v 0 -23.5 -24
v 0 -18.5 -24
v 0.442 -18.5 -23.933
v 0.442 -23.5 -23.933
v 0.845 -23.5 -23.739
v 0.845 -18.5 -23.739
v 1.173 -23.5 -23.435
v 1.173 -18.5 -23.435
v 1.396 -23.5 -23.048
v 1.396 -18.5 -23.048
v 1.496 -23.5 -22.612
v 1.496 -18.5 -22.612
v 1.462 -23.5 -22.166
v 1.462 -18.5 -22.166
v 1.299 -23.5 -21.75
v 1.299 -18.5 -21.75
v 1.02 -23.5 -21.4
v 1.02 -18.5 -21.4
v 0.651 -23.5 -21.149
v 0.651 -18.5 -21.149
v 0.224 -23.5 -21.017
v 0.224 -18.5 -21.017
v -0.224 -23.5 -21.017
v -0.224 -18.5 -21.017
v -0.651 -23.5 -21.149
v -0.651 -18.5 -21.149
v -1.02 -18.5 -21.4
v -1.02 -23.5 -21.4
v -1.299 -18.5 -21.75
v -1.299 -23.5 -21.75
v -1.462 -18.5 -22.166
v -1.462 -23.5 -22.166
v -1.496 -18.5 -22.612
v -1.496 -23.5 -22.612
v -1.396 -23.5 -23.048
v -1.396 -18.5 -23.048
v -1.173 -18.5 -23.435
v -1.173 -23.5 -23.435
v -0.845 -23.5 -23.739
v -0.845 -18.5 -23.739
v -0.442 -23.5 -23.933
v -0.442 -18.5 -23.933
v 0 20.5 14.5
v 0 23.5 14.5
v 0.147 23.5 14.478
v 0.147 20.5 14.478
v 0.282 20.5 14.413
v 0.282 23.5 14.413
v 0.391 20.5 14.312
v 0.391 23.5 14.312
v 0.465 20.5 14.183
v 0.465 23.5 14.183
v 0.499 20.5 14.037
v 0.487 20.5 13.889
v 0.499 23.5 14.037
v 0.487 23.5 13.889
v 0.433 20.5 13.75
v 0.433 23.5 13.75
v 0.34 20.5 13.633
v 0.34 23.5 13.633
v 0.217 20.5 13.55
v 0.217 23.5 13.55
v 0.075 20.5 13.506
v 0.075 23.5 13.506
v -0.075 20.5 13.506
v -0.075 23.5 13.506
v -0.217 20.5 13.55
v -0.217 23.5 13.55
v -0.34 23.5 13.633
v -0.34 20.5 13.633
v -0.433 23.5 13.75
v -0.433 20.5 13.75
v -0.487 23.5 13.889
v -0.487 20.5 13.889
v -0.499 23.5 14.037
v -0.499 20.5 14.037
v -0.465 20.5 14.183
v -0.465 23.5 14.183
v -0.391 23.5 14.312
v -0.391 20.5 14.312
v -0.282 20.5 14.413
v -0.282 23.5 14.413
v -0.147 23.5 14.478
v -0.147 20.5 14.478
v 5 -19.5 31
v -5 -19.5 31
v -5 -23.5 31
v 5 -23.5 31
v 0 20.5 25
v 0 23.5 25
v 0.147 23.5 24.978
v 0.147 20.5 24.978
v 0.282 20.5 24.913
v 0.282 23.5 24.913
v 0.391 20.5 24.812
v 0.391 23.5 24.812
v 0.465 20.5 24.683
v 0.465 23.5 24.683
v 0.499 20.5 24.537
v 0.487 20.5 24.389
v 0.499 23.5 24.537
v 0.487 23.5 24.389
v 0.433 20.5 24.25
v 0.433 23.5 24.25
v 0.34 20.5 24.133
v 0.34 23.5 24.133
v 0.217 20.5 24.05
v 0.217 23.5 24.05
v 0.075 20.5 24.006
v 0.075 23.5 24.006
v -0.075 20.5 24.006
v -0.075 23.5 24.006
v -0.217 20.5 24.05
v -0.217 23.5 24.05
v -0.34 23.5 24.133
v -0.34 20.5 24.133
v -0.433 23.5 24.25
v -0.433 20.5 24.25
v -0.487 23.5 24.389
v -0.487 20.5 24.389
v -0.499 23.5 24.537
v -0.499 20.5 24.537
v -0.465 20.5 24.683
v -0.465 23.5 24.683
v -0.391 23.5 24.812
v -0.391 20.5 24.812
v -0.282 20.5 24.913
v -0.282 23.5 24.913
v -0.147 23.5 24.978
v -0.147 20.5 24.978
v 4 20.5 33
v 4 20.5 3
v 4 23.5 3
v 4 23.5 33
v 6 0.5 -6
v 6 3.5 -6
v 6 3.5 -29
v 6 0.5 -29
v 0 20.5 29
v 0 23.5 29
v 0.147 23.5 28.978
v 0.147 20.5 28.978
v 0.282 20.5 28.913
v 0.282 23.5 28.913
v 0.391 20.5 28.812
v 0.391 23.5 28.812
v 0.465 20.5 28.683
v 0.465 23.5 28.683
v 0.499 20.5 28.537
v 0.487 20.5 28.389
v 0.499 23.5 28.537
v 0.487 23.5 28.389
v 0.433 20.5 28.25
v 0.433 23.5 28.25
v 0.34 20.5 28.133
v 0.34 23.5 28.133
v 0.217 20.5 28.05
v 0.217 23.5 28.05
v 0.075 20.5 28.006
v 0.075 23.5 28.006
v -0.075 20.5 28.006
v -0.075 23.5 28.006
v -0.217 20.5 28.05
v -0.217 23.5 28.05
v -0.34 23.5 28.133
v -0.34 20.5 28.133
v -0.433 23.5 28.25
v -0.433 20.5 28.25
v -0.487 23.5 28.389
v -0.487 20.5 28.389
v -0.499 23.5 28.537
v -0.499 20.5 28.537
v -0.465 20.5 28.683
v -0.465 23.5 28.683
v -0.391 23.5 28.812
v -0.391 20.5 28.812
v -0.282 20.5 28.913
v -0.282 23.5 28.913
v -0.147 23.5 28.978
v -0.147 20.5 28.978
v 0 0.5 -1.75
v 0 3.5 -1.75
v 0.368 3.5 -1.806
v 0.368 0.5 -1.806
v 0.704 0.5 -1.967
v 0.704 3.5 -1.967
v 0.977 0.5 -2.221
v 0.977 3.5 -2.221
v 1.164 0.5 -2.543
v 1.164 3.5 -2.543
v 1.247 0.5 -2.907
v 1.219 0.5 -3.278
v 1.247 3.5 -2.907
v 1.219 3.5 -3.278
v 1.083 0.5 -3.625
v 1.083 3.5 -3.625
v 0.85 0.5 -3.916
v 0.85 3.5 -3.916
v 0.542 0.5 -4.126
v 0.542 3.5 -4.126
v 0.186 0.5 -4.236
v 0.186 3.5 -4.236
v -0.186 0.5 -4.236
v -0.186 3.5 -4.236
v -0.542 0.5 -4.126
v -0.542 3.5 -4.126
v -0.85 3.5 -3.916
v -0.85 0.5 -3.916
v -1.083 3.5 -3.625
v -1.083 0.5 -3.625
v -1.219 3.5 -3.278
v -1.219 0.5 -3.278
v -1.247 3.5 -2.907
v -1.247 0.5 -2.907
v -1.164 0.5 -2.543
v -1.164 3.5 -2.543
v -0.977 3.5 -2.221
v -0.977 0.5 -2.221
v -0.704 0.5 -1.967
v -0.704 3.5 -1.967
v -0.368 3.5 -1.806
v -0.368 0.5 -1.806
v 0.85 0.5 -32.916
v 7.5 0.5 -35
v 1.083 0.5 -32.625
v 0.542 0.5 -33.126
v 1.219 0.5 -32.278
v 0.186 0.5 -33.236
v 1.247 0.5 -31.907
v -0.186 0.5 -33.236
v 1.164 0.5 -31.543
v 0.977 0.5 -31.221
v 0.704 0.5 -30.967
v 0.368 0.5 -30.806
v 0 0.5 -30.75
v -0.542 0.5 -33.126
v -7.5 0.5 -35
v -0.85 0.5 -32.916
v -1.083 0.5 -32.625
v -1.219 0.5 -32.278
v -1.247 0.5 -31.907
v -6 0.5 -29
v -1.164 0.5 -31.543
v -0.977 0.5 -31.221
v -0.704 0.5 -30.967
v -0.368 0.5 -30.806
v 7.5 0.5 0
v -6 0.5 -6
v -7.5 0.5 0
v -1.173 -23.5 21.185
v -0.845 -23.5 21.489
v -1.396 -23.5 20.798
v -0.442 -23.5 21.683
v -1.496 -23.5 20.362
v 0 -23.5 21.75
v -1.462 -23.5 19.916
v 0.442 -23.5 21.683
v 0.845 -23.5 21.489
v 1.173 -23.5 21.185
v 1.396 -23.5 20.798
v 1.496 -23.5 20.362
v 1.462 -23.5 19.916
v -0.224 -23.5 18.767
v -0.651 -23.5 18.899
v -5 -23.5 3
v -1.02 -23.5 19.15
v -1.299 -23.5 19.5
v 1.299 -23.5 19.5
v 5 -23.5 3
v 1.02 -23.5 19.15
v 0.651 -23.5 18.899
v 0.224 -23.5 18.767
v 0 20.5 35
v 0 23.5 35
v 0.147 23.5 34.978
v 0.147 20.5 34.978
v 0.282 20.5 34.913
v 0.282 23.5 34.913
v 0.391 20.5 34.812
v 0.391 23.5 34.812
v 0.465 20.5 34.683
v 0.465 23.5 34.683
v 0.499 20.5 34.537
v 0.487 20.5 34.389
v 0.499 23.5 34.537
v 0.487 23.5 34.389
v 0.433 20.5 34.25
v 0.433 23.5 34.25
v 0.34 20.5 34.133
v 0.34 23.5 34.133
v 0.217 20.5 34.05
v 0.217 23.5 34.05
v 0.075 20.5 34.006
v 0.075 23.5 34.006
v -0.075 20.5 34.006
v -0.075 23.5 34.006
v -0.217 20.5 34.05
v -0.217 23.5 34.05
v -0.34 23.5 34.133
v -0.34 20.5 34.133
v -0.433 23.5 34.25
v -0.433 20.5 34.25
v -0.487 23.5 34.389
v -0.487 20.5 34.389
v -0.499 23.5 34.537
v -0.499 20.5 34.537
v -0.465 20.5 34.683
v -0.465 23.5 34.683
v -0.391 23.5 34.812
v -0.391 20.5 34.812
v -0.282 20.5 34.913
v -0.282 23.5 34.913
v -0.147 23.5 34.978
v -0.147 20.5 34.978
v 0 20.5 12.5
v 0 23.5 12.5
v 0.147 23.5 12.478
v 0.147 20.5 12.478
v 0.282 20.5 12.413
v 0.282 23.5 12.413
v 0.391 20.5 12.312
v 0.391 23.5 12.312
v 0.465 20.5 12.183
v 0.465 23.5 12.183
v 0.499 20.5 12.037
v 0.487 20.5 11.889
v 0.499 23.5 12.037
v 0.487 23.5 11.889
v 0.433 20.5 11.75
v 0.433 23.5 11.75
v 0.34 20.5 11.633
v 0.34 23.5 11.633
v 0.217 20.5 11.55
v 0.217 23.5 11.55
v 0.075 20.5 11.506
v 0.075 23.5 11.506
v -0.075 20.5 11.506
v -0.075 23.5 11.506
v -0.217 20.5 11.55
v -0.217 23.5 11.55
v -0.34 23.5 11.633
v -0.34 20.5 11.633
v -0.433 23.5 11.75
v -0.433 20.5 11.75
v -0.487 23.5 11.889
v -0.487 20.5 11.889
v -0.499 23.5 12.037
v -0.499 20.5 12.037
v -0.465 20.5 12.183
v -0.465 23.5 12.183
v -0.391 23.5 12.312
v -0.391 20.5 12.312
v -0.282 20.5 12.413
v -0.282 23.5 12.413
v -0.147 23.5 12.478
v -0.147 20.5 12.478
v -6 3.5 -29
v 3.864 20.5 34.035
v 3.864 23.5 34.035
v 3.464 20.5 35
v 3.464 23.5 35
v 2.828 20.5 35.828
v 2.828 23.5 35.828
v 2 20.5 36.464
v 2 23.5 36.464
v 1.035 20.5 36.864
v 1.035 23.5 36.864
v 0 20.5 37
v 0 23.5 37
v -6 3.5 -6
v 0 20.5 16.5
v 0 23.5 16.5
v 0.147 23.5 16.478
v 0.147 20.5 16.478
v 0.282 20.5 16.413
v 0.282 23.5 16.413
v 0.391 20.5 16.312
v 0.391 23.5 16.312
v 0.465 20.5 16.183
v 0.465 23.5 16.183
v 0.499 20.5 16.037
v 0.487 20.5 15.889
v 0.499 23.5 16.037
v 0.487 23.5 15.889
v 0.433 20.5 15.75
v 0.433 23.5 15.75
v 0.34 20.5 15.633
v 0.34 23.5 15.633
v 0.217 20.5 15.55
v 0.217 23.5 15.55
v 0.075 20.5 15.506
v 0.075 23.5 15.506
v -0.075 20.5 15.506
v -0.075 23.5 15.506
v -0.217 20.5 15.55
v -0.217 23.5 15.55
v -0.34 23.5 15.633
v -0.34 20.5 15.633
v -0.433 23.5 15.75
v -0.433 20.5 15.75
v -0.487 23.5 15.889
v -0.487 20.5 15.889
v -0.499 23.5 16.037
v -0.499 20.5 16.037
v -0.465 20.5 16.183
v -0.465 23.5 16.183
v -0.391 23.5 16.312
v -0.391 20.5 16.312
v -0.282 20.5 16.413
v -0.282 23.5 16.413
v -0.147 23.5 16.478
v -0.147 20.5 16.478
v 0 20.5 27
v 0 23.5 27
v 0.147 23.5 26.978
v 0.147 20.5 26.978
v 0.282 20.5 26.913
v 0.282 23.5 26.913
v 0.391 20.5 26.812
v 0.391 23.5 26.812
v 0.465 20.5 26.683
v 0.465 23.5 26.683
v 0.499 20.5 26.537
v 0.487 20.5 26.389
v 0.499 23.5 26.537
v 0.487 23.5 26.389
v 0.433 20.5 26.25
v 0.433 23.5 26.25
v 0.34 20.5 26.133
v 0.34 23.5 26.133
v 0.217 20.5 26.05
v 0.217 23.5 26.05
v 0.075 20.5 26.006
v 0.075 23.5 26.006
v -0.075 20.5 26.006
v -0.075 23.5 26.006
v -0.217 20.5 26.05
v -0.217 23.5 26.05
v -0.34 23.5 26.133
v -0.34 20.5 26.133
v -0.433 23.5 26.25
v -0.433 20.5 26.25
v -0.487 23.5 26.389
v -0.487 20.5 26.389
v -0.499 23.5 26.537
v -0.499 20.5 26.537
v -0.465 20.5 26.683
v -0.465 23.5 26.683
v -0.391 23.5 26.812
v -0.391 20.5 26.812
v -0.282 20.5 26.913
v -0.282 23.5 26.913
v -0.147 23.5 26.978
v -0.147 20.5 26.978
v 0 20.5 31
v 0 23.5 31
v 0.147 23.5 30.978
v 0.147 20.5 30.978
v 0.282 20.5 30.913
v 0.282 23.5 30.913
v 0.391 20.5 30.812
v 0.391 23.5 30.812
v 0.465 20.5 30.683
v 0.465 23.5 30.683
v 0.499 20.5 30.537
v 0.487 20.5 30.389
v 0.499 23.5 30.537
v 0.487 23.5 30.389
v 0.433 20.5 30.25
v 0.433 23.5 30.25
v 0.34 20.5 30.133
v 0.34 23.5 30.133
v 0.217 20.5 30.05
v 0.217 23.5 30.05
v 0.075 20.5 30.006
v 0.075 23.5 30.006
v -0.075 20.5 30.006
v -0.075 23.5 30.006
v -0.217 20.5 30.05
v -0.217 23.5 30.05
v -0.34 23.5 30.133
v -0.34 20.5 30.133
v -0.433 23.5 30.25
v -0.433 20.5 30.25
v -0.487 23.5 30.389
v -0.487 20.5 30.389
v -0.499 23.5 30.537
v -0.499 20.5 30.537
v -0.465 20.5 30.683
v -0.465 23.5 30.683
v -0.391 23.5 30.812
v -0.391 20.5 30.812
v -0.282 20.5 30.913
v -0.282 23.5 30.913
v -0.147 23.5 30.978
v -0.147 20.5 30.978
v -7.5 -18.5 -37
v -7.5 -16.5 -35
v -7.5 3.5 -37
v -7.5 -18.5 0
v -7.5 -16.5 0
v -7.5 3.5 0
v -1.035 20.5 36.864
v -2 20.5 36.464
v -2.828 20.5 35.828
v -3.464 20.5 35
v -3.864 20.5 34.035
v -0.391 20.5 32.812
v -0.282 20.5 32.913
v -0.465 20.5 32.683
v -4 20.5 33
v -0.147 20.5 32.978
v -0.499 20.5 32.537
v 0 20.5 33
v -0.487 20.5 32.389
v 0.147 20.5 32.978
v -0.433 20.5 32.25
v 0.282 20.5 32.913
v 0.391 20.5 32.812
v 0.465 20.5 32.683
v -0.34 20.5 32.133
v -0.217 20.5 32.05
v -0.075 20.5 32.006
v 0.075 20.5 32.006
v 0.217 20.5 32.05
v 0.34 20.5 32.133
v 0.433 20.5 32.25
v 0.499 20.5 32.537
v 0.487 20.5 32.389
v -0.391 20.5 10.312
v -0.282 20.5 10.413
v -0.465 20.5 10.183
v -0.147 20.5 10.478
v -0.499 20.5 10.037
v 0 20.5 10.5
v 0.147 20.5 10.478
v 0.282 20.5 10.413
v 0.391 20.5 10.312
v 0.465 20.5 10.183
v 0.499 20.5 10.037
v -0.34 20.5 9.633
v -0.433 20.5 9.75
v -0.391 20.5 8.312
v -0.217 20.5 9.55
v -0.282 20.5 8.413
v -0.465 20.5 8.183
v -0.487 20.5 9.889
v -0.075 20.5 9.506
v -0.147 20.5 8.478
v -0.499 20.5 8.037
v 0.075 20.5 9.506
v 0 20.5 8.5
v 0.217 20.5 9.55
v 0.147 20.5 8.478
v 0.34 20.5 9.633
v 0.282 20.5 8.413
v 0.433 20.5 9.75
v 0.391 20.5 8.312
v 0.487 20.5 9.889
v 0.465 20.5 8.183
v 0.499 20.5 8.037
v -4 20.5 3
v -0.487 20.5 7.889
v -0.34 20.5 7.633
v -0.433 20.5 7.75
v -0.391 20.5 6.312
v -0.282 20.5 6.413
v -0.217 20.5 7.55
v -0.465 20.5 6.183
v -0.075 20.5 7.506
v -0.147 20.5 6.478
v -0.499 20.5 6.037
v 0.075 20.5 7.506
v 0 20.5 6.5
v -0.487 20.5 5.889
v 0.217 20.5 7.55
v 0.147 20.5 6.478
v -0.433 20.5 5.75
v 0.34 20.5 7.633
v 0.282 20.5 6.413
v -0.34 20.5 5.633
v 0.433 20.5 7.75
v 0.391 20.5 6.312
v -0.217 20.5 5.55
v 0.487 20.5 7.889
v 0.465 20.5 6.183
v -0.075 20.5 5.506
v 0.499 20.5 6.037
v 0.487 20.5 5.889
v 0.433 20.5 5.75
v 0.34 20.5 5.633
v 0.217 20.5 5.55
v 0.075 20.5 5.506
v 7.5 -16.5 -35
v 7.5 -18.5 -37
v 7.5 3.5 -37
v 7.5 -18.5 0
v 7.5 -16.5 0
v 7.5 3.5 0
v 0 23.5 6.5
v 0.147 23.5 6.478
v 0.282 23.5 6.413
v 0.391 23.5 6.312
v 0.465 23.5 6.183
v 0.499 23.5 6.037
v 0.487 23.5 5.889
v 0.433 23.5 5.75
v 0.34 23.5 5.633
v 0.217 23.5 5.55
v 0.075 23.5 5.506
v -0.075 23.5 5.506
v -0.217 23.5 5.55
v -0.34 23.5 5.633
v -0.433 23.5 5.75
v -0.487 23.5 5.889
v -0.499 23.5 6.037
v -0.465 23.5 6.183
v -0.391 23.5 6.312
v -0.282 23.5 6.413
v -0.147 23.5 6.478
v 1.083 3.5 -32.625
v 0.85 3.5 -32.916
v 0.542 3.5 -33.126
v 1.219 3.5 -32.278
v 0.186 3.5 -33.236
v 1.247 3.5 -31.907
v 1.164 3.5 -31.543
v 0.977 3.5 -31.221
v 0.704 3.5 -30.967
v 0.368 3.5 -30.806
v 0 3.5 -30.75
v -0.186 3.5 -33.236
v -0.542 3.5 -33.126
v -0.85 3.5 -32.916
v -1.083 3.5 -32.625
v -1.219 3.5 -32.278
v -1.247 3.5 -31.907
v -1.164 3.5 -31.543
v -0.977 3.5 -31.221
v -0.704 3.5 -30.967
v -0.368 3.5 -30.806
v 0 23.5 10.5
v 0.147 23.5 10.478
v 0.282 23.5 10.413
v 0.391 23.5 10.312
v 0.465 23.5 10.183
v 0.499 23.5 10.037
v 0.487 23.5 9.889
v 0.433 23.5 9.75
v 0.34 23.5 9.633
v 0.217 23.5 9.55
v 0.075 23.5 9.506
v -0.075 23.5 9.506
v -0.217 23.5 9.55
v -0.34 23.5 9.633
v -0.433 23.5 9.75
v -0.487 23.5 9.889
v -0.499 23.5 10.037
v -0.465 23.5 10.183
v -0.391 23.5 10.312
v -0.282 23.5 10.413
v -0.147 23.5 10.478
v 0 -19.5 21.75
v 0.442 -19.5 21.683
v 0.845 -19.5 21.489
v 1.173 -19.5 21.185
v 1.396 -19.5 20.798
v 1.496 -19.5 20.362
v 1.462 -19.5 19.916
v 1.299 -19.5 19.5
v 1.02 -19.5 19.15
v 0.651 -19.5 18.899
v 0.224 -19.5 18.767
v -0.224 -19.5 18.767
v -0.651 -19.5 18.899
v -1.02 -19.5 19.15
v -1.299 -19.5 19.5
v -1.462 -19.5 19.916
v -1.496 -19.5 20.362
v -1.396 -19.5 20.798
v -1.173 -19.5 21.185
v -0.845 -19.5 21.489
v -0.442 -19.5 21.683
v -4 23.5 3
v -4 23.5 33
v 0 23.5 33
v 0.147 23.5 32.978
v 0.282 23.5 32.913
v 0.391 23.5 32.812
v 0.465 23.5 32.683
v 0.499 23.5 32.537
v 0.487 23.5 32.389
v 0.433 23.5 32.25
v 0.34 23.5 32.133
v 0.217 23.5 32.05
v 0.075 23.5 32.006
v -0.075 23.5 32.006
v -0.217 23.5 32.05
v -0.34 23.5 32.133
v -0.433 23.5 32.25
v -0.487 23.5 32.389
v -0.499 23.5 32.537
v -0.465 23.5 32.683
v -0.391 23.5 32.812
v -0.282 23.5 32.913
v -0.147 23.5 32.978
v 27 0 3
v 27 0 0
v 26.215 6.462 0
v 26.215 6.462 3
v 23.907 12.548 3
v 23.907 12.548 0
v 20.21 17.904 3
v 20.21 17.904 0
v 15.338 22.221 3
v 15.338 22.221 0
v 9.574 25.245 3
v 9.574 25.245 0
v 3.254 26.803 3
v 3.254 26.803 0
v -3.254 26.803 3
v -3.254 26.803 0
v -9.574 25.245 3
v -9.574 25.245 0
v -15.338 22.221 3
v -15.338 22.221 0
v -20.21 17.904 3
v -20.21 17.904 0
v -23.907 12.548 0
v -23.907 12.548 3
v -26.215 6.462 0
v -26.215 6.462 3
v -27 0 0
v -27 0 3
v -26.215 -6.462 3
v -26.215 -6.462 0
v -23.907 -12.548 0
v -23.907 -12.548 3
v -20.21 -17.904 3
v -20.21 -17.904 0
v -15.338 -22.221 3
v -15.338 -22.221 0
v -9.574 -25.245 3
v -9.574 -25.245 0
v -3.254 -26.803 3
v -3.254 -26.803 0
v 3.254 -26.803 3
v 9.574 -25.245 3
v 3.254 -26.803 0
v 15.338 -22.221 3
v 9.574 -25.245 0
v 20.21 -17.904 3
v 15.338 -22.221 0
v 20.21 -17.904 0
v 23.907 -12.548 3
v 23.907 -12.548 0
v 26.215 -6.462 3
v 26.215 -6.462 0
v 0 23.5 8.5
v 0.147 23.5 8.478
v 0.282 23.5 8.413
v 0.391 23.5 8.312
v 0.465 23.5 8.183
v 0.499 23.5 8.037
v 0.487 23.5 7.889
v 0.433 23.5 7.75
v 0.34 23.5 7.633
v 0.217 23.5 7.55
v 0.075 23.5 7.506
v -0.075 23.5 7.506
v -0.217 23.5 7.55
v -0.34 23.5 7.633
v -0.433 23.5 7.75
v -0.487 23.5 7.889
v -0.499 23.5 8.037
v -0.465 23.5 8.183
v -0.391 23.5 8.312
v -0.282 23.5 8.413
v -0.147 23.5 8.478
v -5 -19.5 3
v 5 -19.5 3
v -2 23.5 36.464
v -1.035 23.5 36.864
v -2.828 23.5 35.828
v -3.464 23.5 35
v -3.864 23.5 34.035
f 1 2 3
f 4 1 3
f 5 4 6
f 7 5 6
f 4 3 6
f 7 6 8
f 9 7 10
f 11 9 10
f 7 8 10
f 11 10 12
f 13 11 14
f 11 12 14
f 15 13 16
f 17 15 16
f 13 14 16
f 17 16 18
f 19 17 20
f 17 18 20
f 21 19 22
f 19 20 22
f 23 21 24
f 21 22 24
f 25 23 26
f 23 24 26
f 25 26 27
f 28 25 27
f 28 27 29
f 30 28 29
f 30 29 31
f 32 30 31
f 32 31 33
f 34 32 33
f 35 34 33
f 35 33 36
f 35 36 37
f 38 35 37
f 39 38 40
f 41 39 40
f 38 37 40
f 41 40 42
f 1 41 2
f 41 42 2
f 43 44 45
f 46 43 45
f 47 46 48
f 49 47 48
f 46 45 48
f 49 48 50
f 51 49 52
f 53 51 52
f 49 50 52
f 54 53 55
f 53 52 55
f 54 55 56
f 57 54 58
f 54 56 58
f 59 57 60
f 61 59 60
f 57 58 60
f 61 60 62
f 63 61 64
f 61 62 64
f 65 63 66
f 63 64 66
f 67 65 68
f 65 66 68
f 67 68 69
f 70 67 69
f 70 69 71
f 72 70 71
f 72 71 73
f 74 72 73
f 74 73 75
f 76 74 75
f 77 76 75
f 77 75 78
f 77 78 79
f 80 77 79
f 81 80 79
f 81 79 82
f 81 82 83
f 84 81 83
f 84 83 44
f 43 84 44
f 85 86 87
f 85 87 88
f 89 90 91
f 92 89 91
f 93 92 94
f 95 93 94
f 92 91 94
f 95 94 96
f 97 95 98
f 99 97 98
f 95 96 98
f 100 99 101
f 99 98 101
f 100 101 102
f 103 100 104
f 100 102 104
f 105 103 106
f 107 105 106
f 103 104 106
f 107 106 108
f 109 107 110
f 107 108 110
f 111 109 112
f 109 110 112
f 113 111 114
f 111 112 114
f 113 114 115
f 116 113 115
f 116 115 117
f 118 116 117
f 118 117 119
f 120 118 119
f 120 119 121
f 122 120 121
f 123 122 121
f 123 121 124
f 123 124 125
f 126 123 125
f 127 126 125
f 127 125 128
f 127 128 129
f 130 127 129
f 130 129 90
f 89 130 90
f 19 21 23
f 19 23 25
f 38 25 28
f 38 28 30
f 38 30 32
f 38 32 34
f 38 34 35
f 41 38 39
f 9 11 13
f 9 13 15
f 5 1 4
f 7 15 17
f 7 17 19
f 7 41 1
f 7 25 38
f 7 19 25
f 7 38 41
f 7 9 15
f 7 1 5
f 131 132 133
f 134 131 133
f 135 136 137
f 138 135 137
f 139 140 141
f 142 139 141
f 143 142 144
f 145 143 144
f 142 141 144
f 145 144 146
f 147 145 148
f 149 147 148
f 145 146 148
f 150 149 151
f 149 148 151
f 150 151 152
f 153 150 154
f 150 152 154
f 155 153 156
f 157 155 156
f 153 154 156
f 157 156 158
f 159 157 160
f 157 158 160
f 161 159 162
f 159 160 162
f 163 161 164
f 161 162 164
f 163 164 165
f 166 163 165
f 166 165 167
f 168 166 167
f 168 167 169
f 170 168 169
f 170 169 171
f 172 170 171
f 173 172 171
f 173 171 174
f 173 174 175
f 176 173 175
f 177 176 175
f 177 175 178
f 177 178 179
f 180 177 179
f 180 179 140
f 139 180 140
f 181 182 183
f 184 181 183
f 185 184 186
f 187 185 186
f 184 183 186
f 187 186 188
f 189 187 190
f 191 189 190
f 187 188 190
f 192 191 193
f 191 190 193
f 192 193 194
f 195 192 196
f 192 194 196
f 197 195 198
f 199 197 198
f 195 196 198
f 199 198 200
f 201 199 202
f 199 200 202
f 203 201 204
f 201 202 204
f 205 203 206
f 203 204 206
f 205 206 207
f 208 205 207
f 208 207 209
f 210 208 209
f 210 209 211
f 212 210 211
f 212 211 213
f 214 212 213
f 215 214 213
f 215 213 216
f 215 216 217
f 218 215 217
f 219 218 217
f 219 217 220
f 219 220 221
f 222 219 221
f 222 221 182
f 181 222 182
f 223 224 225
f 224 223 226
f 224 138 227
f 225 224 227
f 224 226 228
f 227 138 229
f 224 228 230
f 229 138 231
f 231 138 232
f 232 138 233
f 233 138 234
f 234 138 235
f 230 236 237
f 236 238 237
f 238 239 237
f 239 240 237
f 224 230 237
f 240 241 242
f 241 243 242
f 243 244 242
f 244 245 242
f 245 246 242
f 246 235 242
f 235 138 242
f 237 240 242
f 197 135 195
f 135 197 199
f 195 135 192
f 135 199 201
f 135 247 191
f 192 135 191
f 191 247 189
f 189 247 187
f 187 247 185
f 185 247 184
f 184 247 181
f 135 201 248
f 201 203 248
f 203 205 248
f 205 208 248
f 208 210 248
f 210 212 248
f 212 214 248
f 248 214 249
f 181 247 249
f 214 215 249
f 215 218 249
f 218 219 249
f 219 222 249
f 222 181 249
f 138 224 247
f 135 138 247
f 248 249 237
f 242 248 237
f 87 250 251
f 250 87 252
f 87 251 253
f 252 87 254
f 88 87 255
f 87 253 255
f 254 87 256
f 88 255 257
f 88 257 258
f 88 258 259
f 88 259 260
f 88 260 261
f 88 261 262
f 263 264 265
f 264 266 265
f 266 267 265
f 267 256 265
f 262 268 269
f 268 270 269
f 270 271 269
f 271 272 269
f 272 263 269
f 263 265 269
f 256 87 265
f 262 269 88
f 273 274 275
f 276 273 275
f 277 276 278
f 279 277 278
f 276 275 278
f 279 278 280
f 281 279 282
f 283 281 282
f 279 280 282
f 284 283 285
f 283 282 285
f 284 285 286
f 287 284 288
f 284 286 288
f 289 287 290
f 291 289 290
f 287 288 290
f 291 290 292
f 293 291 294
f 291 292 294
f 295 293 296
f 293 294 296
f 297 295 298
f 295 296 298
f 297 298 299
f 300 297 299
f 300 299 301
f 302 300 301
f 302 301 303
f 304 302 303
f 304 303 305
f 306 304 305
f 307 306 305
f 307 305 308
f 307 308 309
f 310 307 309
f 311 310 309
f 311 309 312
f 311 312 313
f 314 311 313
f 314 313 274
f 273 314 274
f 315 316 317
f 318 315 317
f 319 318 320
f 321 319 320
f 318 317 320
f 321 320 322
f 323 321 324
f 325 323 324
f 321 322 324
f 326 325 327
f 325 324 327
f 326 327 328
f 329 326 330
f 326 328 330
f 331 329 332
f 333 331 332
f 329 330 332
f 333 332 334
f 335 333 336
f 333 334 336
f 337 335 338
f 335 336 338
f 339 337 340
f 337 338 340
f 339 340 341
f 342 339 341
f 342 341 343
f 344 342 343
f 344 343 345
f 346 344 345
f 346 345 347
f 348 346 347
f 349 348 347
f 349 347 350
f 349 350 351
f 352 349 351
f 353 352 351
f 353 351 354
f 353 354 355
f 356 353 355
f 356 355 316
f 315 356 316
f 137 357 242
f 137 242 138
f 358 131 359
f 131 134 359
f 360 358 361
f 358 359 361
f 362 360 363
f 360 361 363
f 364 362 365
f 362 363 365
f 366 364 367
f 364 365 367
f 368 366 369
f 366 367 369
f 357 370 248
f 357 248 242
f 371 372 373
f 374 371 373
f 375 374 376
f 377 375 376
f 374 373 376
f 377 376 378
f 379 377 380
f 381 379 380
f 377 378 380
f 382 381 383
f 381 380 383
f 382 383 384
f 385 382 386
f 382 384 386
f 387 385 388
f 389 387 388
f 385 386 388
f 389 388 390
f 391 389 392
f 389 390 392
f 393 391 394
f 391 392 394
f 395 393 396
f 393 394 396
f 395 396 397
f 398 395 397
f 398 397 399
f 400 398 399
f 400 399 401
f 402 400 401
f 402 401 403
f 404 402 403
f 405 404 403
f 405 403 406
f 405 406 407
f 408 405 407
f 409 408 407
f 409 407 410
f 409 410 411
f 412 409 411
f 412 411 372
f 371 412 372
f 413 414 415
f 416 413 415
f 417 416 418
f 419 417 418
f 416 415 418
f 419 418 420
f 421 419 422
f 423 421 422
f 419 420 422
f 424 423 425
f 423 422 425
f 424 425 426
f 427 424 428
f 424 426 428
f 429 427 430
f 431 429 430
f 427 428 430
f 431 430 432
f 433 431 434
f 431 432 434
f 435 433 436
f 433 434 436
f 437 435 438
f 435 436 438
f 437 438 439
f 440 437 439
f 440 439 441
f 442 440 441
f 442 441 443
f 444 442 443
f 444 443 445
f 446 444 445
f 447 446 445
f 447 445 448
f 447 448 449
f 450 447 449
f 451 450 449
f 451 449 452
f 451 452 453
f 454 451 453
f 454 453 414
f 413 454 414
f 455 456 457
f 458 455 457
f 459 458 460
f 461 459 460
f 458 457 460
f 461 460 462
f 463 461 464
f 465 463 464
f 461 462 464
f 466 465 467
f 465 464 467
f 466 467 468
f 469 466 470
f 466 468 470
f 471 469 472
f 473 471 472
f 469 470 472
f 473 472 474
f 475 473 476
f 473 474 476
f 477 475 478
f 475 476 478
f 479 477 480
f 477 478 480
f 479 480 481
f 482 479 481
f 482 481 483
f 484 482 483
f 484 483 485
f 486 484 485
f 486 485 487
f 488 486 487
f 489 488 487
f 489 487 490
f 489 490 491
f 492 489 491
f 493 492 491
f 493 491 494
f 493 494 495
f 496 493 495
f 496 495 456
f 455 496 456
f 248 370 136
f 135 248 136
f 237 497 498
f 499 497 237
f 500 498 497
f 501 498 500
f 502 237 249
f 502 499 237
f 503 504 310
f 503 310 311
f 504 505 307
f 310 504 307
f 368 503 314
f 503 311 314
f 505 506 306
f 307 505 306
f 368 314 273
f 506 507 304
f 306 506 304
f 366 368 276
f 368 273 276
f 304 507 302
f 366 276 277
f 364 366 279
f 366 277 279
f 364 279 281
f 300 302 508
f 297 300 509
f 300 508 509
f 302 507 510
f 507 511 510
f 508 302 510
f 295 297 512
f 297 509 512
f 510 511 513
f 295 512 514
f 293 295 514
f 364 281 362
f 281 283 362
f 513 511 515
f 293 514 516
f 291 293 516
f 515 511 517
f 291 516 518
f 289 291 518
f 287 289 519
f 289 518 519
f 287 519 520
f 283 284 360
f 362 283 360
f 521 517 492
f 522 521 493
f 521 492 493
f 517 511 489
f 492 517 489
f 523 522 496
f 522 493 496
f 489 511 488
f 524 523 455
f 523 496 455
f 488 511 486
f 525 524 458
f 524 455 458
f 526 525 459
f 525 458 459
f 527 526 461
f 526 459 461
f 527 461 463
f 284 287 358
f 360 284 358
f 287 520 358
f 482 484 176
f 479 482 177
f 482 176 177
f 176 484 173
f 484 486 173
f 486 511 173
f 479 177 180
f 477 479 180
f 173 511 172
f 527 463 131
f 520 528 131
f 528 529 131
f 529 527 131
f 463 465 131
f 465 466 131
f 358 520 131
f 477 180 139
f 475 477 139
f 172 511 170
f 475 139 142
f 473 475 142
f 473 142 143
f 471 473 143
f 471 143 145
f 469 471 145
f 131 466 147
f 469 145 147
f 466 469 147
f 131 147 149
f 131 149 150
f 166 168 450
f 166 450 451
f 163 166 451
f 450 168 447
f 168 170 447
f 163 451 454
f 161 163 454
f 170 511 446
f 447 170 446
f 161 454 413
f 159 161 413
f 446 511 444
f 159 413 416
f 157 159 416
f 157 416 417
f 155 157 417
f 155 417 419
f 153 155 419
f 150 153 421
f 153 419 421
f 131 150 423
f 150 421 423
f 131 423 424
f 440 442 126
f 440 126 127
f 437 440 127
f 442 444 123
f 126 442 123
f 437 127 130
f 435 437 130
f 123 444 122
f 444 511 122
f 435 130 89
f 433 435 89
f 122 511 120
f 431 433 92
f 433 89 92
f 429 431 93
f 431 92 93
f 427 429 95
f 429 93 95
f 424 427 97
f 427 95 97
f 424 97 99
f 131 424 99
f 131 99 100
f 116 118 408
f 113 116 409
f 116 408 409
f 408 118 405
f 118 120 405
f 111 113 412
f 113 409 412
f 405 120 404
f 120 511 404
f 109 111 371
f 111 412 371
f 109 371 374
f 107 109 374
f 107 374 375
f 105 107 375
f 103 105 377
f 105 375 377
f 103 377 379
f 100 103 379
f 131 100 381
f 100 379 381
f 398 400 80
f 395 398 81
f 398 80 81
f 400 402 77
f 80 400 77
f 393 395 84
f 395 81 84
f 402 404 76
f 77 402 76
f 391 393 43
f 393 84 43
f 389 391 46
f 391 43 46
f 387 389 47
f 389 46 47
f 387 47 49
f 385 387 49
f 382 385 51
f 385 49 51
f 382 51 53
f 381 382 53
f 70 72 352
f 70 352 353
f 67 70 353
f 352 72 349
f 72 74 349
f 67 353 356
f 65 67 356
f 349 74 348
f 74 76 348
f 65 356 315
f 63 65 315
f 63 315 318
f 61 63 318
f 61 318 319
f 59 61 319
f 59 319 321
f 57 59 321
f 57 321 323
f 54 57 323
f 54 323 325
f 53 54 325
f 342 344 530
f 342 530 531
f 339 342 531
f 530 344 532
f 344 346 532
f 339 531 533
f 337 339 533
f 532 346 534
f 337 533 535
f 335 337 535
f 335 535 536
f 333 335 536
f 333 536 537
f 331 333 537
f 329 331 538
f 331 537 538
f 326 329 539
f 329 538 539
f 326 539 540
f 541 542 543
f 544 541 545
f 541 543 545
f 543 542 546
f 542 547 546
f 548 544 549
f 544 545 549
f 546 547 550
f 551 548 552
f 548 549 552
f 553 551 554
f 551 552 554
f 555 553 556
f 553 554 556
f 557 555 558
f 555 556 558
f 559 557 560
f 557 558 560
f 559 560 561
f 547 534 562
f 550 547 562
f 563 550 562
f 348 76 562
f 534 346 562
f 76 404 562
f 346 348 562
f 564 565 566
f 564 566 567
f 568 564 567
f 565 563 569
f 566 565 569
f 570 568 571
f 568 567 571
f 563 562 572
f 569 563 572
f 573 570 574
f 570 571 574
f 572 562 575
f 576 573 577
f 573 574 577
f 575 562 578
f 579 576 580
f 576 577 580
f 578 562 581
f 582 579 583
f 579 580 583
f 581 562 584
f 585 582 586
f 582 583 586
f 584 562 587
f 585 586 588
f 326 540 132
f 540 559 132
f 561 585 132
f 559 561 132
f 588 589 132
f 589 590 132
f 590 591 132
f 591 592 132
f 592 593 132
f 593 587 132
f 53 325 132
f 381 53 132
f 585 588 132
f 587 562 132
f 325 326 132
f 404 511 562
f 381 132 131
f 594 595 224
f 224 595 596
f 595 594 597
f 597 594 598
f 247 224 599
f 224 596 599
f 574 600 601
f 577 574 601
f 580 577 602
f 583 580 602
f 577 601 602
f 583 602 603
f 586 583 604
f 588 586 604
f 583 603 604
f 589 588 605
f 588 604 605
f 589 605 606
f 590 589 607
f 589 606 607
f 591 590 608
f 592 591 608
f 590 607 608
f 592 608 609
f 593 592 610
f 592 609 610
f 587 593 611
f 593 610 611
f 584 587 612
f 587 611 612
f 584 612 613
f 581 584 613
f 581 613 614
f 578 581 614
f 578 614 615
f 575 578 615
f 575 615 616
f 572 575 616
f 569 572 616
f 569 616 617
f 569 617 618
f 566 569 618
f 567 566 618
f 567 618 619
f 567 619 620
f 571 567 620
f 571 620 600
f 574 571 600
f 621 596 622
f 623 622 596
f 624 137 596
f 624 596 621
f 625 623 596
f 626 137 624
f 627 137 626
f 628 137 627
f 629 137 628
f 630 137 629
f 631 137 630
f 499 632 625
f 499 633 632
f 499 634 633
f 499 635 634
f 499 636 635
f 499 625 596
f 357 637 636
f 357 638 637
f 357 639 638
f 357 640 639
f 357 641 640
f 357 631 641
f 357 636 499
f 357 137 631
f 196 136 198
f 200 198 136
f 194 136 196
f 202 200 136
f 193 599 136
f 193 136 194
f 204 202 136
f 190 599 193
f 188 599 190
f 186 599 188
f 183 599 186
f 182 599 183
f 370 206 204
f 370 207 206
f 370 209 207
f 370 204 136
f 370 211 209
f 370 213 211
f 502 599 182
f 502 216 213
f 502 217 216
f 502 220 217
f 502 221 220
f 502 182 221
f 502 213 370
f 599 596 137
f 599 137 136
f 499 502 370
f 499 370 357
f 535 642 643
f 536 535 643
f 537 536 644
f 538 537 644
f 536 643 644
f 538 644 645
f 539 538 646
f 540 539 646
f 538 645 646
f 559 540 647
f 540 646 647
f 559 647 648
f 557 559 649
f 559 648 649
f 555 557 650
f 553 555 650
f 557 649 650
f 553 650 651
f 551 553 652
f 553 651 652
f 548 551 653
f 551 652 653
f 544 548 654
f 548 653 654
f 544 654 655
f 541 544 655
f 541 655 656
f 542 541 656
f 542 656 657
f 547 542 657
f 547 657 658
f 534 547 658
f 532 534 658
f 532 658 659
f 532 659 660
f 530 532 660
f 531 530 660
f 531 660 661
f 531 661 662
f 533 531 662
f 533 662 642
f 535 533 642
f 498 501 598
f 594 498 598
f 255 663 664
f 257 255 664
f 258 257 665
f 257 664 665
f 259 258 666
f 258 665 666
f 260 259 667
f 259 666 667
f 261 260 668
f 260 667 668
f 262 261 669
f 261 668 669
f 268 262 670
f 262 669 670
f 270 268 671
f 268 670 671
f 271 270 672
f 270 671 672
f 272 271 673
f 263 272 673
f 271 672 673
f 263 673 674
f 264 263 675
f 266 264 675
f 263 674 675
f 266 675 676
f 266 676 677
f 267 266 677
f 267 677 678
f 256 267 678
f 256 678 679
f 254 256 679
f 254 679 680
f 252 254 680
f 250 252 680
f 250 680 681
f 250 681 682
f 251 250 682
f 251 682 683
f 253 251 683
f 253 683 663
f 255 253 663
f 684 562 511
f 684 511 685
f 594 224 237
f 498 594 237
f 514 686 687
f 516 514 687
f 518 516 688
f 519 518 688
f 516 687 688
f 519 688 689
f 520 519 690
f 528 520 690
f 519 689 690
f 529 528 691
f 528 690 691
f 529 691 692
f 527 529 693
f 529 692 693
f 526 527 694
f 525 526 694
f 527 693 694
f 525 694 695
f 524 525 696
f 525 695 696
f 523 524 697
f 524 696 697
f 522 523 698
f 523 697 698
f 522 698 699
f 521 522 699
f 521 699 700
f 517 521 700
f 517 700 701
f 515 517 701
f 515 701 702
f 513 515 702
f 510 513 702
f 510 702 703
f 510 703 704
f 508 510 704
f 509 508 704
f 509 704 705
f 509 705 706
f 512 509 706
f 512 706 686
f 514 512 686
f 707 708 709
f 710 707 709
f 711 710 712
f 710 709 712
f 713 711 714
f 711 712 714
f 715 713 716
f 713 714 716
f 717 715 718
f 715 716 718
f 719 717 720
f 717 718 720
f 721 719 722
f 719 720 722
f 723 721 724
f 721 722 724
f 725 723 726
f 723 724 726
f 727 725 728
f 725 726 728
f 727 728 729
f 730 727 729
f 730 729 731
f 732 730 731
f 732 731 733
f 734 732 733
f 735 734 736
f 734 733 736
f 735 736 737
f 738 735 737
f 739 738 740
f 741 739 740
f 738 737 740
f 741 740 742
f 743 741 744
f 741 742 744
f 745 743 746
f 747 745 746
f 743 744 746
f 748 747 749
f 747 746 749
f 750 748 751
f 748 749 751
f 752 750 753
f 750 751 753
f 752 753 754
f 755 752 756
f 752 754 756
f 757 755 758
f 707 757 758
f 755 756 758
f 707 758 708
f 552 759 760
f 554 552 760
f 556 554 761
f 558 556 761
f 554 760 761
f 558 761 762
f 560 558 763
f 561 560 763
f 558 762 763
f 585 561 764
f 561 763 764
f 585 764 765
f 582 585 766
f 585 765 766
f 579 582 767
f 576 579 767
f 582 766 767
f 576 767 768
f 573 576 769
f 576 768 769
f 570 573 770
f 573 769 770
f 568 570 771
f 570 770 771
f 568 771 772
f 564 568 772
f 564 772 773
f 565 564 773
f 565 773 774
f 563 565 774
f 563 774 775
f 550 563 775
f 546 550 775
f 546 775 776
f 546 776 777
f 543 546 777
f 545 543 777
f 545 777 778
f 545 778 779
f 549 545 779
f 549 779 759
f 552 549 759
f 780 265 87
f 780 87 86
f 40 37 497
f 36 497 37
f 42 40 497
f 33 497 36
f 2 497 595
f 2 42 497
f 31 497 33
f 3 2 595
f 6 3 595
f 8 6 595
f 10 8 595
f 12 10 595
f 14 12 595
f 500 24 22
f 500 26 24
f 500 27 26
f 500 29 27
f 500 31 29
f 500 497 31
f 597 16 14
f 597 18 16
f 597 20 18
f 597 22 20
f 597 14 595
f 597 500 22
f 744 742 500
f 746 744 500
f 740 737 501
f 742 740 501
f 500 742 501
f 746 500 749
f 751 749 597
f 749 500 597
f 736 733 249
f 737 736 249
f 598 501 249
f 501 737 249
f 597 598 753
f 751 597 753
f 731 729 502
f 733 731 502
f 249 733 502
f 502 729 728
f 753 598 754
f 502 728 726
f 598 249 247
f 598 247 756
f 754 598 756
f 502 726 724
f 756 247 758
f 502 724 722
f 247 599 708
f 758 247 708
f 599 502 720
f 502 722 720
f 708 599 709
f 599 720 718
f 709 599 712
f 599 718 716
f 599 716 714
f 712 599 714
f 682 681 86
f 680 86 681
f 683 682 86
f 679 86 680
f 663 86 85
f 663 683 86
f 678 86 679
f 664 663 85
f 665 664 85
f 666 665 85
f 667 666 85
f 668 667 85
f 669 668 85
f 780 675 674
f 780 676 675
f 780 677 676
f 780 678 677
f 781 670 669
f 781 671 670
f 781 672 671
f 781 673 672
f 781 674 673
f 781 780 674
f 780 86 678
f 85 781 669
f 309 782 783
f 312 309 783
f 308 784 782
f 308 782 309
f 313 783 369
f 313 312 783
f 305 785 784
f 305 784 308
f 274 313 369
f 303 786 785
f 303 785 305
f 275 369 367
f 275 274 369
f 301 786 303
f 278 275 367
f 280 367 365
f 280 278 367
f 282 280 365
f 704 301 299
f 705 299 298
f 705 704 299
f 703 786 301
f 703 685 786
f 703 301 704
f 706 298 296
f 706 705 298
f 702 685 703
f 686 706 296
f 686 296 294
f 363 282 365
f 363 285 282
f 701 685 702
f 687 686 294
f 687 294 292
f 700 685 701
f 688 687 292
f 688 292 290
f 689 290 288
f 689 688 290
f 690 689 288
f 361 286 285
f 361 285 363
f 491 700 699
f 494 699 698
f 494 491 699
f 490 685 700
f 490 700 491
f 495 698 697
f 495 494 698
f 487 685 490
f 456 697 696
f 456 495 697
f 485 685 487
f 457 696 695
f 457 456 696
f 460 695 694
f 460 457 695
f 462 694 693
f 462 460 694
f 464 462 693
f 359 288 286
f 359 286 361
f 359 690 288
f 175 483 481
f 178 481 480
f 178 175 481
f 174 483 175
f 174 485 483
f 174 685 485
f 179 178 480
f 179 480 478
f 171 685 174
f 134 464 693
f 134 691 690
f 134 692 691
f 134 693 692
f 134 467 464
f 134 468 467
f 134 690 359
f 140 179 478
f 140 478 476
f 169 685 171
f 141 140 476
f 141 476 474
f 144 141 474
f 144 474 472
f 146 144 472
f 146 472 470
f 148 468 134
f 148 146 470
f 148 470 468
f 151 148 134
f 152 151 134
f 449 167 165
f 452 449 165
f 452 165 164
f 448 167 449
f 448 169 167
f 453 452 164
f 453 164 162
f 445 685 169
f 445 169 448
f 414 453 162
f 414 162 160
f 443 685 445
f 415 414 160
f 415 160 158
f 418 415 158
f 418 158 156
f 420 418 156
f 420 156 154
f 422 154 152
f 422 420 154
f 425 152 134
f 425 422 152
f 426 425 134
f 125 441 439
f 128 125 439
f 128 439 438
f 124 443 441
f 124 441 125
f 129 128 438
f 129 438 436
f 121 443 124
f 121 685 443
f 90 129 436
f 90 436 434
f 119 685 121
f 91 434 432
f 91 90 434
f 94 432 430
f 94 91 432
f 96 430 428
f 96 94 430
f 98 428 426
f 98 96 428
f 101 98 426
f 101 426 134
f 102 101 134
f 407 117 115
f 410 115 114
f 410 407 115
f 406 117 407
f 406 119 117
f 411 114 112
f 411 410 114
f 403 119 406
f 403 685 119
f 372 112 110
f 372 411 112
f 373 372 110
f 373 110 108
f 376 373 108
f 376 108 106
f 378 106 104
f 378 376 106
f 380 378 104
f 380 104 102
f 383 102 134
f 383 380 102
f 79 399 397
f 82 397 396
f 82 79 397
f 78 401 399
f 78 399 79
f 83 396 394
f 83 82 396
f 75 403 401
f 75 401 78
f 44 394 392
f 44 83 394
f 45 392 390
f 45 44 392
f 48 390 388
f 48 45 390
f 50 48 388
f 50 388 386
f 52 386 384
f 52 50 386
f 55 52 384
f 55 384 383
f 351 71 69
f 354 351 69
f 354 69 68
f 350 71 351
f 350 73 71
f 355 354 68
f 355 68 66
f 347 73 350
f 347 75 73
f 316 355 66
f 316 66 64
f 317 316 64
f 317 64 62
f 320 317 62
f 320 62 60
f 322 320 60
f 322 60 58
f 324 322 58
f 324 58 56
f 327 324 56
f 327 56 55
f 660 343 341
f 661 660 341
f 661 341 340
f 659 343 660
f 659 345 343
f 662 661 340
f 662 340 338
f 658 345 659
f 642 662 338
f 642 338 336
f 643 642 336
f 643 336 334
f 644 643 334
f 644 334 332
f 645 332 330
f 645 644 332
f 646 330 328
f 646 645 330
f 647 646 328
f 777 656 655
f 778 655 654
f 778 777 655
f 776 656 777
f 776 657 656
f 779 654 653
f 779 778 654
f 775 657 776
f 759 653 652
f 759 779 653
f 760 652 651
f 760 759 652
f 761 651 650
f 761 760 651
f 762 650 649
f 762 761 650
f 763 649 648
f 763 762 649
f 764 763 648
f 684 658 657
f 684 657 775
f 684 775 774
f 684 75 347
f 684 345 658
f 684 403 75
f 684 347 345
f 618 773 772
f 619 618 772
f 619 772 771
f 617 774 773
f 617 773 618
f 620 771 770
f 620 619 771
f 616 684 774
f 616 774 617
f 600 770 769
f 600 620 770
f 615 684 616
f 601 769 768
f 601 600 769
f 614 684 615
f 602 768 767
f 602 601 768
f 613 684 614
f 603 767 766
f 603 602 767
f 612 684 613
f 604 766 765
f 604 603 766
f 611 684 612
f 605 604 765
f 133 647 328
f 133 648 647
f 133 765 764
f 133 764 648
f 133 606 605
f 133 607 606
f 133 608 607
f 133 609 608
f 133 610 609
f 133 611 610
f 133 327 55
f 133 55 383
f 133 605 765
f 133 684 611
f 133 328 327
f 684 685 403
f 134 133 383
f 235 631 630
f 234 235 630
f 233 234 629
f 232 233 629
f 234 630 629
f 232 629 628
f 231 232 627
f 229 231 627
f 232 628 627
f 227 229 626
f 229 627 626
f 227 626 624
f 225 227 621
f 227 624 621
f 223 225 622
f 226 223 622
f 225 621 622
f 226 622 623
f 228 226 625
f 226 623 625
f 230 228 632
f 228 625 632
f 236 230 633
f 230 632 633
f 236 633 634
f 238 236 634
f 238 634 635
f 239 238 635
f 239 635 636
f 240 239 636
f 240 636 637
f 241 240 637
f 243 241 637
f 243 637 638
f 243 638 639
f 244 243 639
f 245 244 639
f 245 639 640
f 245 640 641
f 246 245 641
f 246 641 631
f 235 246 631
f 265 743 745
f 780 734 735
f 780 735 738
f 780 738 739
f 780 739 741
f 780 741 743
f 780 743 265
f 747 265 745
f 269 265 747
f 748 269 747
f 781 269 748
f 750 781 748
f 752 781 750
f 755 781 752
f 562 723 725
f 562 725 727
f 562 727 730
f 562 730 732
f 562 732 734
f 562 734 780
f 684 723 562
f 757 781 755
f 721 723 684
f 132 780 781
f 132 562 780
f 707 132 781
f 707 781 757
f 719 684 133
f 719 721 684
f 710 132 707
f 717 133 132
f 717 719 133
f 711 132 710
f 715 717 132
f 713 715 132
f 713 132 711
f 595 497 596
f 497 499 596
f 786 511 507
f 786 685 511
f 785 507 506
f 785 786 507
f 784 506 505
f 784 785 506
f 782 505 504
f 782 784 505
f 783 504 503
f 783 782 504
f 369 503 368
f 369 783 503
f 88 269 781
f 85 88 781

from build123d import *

# Parameters (mm, degrees)
SKETCH1_R           = 27
BOSS_EXTRUDE1_DEPTH = 3
SKETCH2_W           = 8
SKETCH2_H           = 3
BOSS_EXTRUDE2_DEPTH = 34
SKETCH5_R           = 0.5
CUT_EXTRUDE1_DEPTH  = 5
FILLET1_R           = 4
SKETCH6_W           = 15
SKETCH6_H           = 3
BOSS_EXTRUDE3_DEPTH = 35
SKETCH7_R           = 1.25
SKETCH7_W           = 12
SKETCH7_H           = 23
CUT_EXTRUDE2_DEPTH  = 5
SKETCH8_W           = 15
SKETCH8_H           = 20
BOSS_EXTRUDE4_DEPTH = 2
SKETCH9_W           = 15
SKETCH9_H           = 37
BOSS_EXTRUDE5_DEPTH = 2
SKETCH10_W          = 10
SKETCH10_H          = 4
BOSS_EXTRUDE6_DEPTH = 28
SKETCH11_R          = 1.5
CUT_EXTRUDE3_DEPTH  = 5
SKETCH12_R          = 1.5
BOSS_EXTRUDE7_DEPTH = 5


with BuildPart() as part:
    # Sketch1 → Boss-Extrude1 (new body)
    with BuildSketch(Plane.XY):
        Circle(SKETCH1_R)
    extrude(amount=BOSS_EXTRUDE1_DEPTH)

    # Sketch2 → Boss-Extrude2 (add)
    with BuildSketch(Plane.XY.offset(3)):
        with Locations((0, 22)):
            Rectangle(SKETCH2_W, SKETCH2_H)
    extrude(amount=BOSS_EXTRUDE2_DEPTH)

    # Sketch5 → Cut-Extrude1 (cut)
    with BuildSketch(Plane(origin=(0, 23.5, 0), x_dir=(1, 0, 0), z_dir=(0, 1, 0))):
        with Locations(Location((0, -6, 0), (0, 0, 270))):
            Circle(SKETCH5_R)
        with Locations(Location((0, -8, 0), (0, 0, 270))):
            Circle(SKETCH5_R)
        with Locations(Location((0, -10, 0), (0, 0, 270))):
            Circle(SKETCH5_R)
        with Locations(Location((0, -12, 0), (0, 0, 270))):
            Circle(SKETCH5_R)
        with Locations(Location((0, -14, 0), (0, 0, 270))):
            Circle(SKETCH5_R)
        with Locations(Location((0, -16, 0), (0, 0, 270))):
            Circle(SKETCH5_R)
        with Locations(Location((0, -34.5, 0), (0, 0, 270))):
            Circle(SKETCH5_R)
        with Locations(Location((0, -32.5, 0), (0, 0, 270))):
            Circle(SKETCH5_R)
        with Locations(Location((0, -30.5, 0), (0, 0, 270))):
            Circle(SKETCH5_R)
        with Locations(Location((0, -28.5, 0), (0, 0, 270))):
            Circle(SKETCH5_R)
        with Locations(Location((0, -26.5, 0), (0, 0, 270))):
            Circle(SKETCH5_R)
        with Locations(Location((0, -24.5, 0), (0, 0, 270))):
            Circle(SKETCH5_R)
    extrude(amount=-CUT_EXTRUDE1_DEPTH, mode=Mode.SUBTRACT)

    # Fillet1
    fillet1_edges = [part.edges().sort_by_distance(p)[0] for p in [
        (-4, 22, 37),
        (4, 22, 37),
    ]]
    fillet(fillet1_edges, radius=FILLET1_R - 0.0001)  # a hair under: the kernel refuses the full size

    # Sketch6 → Boss-Extrude3 (add)
    with BuildSketch(Plane(origin=(0, 0, 0), x_dir=(-1, 0, 0), z_dir=(0, 0, -1))):
        with Locations((0, 2)):
            Rectangle(SKETCH6_W, SKETCH6_H)
    extrude(amount=BOSS_EXTRUDE3_DEPTH)

    # Sketch7 → Cut-Extrude2 (cut)
    with BuildSketch(Plane(origin=(0, 3.5, 0), x_dir=(1, 0, 0), z_dir=(0, 1, 0))):
        with Locations(Location((0, 32, 0), (0, 0, 270))):
            Circle(SKETCH7_R)
        with Locations(Location((0, 3, 0), (0, 0, 270))):
            Circle(SKETCH7_R)
        with Locations((0, 17.5)):
            Rectangle(SKETCH7_W, SKETCH7_H)
    extrude(amount=-CUT_EXTRUDE2_DEPTH, mode=Mode.SUBTRACT)

    # Sketch8 → Boss-Extrude4 (add)
    with BuildSketch(Plane(origin=(0, 0, -35), x_dir=(-1, 0, 0), z_dir=(0, 0, -1))):
        with Locations((0, -6.5)):
            Rectangle(SKETCH8_W, SKETCH8_H)
    extrude(amount=BOSS_EXTRUDE4_DEPTH)

    # Sketch9 → Boss-Extrude5 (add)
    with BuildSketch(Plane.XZ.offset(16.5)):
        with Locations((0, -18.5)):
            Rectangle(SKETCH9_W, SKETCH9_H)
    extrude(amount=BOSS_EXTRUDE5_DEPTH)

    # Sketch10 → Boss-Extrude6 (add)
    with BuildSketch(Plane.XY.offset(3)):
        with Locations((0, -21.5)):
            Rectangle(SKETCH10_W, SKETCH10_H)
    extrude(amount=BOSS_EXTRUDE6_DEPTH)

    # Sketch11 → Cut-Extrude3 (cut)
    with BuildSketch(Plane(origin=(0, -19.5, 0), x_dir=(1, 0, 0), z_dir=(0, 1, 0))):
        with Locations(Location((0, -20.25, 0), (0, 0, 270))):
            Circle(SKETCH11_R)
    extrude(amount=-CUT_EXTRUDE3_DEPTH, mode=Mode.SUBTRACT)

    # Sketch12 → Boss-Extrude7 (add)
    with BuildSketch(Plane.XZ.offset(18.5)):
        with Locations(Location((0, -22.5, 0), (0, 0, 270))):
            Circle(SKETCH12_R)
    extrude(amount=BOSS_EXTRUDE7_DEPTH)


solid = part.part
